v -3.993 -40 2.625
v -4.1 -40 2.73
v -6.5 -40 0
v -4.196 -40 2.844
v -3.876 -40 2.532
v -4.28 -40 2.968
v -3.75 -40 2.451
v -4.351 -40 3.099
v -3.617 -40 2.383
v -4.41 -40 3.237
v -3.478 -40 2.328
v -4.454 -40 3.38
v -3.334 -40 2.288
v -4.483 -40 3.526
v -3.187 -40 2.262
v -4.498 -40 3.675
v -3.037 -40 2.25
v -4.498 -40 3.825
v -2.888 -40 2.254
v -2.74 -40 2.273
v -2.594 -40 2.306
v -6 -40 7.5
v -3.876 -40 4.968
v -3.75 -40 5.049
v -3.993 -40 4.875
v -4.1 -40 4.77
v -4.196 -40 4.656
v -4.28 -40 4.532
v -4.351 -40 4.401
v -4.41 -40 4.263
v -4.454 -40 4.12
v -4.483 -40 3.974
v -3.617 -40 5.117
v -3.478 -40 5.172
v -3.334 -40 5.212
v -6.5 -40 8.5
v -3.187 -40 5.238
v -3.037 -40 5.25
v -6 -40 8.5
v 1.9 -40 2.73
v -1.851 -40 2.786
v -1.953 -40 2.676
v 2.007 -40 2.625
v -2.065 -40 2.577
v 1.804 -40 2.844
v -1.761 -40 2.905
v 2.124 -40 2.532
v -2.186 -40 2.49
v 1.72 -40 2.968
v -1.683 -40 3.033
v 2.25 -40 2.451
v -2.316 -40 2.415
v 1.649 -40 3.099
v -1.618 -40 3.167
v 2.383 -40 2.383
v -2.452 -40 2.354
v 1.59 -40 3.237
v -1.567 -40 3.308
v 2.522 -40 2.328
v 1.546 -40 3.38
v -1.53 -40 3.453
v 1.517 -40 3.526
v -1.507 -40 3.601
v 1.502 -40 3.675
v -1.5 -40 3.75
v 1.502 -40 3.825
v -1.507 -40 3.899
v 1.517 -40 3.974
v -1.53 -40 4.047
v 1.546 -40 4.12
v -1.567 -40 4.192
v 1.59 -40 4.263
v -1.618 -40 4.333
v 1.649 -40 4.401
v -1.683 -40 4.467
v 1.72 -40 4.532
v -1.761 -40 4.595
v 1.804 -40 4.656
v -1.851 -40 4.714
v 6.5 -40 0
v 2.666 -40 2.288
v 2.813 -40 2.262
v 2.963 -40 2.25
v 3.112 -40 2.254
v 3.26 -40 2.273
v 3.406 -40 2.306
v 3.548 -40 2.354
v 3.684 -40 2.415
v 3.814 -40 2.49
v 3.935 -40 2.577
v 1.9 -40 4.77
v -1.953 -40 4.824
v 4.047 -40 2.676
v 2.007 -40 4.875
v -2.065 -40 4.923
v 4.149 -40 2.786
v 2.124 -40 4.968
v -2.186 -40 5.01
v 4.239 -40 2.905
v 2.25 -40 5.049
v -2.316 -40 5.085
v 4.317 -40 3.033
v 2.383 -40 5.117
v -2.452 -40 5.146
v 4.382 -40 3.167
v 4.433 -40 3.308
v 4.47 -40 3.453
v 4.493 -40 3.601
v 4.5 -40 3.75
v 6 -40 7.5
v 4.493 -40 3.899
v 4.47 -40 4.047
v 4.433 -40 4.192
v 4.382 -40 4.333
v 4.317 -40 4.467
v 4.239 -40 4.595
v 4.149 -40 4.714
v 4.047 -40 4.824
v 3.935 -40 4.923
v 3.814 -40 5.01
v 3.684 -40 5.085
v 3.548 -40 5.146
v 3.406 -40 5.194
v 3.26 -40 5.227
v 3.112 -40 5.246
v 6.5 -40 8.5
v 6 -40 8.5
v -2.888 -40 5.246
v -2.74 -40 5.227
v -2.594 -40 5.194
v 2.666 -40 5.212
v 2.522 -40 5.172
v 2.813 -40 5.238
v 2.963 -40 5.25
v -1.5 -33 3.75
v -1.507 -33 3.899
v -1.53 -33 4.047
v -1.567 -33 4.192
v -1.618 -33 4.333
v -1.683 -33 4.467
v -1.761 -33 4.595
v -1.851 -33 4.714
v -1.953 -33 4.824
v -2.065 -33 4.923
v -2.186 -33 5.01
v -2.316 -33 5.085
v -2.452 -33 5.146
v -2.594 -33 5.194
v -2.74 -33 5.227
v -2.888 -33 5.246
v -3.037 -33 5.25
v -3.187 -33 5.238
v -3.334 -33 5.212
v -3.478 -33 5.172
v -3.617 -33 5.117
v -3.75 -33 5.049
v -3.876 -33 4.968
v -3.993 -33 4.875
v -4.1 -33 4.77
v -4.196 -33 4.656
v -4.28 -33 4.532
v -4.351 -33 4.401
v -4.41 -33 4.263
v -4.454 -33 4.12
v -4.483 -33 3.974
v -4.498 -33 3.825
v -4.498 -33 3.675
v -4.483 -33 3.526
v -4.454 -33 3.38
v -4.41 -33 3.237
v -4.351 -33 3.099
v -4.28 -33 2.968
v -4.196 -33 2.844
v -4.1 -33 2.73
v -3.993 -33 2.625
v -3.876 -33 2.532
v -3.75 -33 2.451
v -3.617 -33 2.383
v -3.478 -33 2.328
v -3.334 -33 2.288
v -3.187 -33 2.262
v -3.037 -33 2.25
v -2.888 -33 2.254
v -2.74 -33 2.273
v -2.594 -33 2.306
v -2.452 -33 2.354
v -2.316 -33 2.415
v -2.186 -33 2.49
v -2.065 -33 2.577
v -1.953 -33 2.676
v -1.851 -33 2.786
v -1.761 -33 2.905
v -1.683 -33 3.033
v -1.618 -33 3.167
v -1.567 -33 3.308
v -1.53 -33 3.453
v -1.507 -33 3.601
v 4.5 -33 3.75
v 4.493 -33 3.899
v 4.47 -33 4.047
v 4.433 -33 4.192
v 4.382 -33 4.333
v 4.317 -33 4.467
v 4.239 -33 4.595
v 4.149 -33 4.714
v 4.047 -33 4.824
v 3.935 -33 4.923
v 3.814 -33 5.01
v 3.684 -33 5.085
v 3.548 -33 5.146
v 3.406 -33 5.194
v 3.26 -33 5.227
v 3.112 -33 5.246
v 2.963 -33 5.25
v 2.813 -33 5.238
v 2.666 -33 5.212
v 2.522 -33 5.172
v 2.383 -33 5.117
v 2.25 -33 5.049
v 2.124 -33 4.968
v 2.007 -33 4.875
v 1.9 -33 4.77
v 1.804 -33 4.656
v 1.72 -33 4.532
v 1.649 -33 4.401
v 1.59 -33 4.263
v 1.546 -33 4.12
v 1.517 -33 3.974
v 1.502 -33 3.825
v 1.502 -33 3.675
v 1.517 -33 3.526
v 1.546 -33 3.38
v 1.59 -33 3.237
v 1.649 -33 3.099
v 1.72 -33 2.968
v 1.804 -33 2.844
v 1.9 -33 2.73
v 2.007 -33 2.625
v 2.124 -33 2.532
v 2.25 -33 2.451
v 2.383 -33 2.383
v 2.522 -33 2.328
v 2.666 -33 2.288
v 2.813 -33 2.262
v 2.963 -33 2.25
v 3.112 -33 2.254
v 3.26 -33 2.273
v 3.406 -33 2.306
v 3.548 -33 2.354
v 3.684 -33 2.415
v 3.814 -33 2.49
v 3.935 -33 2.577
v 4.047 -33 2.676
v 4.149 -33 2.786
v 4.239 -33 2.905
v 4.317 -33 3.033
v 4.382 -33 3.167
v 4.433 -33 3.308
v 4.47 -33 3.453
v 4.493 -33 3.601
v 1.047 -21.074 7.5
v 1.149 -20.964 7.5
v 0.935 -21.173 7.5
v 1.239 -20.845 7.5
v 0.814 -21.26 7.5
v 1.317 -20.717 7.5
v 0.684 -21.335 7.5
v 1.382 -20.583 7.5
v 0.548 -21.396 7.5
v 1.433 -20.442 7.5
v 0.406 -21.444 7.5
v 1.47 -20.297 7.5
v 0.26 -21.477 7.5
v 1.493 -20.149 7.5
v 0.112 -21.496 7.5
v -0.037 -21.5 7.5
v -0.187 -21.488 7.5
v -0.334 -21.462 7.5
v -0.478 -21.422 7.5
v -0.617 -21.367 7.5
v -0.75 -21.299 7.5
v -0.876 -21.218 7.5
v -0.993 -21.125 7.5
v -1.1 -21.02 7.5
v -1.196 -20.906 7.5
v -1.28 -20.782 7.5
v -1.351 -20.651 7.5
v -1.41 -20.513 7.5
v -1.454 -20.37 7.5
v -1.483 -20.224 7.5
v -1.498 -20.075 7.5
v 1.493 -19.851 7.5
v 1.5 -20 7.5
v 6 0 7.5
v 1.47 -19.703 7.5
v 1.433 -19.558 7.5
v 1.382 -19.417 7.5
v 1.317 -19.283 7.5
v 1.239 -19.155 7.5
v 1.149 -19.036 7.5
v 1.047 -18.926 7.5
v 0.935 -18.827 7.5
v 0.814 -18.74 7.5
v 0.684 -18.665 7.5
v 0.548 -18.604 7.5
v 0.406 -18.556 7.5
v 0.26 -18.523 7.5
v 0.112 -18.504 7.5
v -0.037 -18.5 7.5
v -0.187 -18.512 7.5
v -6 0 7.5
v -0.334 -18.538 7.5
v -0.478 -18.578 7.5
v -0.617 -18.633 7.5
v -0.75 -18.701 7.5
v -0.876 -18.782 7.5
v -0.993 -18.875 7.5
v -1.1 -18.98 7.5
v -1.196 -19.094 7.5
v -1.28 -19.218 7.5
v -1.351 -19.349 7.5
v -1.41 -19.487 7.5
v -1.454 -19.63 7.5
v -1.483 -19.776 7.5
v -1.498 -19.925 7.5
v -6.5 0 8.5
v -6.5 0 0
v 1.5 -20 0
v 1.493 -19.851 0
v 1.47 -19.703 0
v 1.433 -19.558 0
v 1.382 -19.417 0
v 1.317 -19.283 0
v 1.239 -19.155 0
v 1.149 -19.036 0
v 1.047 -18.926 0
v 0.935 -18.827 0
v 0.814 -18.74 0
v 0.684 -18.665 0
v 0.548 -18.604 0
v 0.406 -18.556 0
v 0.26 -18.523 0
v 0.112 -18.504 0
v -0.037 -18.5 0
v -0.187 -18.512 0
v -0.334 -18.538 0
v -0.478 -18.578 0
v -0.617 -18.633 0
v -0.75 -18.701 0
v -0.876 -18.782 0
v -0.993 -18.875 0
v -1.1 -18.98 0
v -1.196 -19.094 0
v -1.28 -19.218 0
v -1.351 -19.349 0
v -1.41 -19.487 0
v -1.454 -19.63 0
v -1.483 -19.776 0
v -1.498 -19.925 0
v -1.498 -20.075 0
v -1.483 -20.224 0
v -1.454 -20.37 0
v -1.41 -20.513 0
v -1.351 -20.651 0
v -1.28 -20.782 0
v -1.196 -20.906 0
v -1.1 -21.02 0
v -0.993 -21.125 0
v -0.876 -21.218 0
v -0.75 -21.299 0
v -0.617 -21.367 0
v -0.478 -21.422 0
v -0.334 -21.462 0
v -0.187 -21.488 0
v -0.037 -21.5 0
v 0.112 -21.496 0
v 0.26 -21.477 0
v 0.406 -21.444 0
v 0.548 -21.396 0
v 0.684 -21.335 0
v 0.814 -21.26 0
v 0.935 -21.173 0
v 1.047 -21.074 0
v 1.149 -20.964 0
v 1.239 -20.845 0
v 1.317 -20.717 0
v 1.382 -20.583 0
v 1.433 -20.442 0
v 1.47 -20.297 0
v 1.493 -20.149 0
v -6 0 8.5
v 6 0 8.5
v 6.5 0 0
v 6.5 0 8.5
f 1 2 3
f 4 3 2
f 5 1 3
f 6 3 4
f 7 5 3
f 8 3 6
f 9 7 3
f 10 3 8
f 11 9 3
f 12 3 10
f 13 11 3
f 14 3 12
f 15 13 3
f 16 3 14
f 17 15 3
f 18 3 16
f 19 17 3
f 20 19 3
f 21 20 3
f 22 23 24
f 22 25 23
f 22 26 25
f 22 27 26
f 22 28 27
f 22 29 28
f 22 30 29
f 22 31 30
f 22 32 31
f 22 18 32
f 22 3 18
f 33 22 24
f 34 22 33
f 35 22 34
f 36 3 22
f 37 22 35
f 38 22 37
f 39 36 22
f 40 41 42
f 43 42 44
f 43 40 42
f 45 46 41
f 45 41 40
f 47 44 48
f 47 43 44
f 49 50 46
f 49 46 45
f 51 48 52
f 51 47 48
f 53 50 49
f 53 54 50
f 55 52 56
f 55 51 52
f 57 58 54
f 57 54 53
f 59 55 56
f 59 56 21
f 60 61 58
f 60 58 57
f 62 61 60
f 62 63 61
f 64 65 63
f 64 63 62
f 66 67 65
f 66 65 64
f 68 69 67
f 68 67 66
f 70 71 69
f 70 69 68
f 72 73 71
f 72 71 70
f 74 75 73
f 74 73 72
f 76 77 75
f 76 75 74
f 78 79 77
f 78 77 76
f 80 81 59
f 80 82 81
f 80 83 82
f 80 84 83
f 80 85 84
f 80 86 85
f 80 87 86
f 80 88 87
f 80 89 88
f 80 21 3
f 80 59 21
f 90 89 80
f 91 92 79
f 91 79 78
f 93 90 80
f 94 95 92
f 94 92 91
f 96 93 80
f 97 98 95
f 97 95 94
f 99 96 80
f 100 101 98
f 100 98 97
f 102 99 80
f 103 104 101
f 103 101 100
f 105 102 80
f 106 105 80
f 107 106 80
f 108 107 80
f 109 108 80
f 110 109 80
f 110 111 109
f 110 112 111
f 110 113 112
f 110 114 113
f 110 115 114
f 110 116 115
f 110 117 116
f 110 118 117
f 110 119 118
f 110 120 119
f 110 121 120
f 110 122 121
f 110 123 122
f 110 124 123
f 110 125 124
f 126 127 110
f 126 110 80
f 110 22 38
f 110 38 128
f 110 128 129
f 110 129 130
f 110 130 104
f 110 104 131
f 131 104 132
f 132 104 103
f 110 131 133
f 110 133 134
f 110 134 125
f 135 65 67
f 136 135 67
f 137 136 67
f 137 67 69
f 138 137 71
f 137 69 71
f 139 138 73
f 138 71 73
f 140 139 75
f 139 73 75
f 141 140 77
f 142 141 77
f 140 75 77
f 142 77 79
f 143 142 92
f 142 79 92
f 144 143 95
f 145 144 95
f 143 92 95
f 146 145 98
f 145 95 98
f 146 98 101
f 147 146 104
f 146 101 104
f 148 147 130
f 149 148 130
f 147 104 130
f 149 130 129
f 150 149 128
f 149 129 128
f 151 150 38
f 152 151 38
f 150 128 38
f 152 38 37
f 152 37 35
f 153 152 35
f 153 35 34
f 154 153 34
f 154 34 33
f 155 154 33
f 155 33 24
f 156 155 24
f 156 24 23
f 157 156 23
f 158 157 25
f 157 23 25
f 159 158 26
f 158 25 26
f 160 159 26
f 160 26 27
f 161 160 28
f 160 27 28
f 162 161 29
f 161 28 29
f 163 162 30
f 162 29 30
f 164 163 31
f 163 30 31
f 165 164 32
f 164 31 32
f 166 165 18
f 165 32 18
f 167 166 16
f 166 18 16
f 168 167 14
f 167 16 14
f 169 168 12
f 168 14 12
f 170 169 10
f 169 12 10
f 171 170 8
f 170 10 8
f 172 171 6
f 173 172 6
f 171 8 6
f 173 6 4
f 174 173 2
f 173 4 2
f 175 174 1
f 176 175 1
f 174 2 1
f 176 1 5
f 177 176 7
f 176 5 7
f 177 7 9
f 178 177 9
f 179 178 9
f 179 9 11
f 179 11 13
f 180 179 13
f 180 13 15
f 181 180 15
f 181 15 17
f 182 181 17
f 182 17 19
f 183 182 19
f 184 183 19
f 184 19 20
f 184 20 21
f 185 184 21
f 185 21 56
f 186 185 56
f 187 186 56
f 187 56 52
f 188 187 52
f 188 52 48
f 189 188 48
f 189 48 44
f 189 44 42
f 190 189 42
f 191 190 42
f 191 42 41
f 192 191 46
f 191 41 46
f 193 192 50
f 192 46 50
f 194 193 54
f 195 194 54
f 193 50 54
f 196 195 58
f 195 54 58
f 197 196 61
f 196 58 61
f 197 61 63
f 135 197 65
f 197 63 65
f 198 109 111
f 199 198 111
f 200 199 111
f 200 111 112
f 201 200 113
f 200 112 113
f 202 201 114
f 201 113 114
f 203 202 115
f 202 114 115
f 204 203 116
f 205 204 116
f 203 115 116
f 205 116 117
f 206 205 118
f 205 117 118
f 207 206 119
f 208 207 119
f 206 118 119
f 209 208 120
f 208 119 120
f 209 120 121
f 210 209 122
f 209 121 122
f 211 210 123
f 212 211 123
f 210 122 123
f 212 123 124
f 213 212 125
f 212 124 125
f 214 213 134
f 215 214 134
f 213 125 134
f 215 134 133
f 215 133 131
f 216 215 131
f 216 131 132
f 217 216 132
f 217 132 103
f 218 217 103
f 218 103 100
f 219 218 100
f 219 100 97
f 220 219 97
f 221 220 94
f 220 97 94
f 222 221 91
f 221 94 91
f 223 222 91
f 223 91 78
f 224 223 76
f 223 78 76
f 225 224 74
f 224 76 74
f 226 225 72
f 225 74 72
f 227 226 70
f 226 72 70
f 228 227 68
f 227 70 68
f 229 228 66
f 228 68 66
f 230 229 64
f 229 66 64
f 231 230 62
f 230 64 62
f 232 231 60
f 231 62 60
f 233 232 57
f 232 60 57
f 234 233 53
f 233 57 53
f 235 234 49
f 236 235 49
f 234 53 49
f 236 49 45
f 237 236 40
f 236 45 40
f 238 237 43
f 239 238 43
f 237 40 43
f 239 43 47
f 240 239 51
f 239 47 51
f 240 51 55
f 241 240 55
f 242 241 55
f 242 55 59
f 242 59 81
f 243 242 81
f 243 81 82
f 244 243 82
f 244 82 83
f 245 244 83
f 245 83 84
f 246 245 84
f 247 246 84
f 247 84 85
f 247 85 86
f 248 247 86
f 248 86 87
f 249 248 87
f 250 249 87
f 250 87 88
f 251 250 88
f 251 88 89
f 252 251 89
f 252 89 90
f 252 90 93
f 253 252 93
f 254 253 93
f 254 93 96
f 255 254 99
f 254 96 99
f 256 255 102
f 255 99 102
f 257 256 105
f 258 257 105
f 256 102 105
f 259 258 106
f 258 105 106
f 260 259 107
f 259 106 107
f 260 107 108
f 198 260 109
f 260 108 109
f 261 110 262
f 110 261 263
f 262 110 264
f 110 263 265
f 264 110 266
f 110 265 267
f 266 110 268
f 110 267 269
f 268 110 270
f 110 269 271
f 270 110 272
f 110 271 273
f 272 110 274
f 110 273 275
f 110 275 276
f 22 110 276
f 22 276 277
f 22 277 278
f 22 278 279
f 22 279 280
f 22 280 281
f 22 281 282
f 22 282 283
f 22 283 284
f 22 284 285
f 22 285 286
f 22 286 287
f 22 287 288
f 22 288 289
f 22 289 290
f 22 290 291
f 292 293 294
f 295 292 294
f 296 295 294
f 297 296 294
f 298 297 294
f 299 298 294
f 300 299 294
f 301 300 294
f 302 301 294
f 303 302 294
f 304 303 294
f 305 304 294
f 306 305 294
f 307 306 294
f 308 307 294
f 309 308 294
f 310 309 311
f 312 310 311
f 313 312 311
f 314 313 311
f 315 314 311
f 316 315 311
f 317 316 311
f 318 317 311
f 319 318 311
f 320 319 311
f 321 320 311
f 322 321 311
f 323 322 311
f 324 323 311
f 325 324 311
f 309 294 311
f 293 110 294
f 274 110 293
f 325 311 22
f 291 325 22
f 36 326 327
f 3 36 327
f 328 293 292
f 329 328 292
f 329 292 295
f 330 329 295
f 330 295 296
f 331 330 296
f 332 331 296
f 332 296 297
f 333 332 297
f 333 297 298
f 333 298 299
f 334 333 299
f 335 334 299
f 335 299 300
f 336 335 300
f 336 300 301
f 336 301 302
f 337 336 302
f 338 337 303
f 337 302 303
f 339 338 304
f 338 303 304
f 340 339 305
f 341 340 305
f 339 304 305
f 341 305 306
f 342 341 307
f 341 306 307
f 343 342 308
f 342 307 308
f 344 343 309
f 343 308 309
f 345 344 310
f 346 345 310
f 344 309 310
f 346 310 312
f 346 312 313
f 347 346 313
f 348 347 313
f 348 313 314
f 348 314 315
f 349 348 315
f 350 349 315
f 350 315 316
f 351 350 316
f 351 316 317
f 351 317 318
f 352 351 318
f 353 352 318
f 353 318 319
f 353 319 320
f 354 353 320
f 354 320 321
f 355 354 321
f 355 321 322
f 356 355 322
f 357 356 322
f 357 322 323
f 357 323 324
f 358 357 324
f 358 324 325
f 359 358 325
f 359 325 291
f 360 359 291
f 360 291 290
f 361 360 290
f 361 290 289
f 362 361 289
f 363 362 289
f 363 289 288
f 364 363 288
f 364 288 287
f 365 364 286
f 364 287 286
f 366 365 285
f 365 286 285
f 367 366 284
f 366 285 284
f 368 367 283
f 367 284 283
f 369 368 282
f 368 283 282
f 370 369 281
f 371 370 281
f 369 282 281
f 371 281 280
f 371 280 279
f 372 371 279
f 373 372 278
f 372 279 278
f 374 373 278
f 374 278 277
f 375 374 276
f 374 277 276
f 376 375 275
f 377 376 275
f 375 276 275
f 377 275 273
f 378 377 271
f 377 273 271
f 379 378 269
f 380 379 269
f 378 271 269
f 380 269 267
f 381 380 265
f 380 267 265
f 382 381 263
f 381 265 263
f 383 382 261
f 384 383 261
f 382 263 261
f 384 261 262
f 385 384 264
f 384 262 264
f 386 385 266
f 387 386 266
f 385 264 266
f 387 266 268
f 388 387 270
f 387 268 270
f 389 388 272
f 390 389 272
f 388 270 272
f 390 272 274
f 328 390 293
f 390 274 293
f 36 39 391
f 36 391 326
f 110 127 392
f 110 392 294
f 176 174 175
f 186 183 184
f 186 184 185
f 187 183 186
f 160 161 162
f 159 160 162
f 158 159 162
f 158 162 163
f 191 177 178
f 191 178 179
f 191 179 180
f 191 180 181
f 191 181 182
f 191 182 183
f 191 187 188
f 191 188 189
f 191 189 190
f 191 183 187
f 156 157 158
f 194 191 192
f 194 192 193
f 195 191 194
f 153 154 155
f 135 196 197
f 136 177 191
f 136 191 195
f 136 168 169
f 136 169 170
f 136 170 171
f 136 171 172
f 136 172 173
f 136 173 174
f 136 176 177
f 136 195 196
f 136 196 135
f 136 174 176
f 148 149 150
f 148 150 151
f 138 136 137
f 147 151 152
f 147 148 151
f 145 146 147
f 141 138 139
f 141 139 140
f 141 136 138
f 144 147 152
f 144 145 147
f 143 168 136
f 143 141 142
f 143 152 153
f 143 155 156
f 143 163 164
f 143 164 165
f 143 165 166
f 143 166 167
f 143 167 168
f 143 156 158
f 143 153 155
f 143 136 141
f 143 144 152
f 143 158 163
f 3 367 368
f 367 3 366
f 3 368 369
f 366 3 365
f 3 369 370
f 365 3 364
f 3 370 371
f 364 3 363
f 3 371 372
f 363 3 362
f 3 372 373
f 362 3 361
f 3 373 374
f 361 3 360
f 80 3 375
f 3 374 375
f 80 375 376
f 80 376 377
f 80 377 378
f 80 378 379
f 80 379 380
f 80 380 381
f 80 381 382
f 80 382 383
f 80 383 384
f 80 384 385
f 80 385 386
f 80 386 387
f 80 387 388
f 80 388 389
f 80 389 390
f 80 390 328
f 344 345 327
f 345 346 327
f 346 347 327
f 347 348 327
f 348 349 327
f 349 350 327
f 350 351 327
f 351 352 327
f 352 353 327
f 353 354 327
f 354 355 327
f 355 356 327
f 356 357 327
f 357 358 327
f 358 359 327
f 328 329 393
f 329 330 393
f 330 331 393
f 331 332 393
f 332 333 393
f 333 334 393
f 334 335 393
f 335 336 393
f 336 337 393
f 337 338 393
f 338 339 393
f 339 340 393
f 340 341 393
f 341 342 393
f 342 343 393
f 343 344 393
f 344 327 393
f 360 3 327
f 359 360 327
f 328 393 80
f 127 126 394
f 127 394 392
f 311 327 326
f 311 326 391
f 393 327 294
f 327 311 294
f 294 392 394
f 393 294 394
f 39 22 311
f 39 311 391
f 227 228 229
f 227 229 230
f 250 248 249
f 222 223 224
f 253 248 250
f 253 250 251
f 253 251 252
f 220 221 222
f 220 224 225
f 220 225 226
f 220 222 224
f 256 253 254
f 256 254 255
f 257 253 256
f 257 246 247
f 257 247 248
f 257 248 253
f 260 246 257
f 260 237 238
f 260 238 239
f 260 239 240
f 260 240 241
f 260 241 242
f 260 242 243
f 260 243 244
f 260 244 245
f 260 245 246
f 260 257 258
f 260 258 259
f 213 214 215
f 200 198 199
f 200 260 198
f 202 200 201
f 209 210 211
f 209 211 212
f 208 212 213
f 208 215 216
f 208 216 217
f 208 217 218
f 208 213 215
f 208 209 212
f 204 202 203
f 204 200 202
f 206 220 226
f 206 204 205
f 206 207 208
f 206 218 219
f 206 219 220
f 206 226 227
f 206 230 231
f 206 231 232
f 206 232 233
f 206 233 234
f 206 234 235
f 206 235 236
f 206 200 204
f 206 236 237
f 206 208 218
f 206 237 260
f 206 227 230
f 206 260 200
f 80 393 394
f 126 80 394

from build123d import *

# Parameters (mm, degrees)
F1_DEPTH = 40
F2_R     = 1.5
F3_DEPTH = 25
F4_R     = 1.5
F5_DEPTH = 7


with BuildPart() as f1:
    # F0 (on Front) → F1 (new body)
    with BuildSketch(Plane.XZ):
        Polygon((0, 0), (0, 7.5), (-6, 7.5), (-6, 8.5), (-6.5, 8.5), (-6.5, 0), align=None)
        Polygon((6, 7.5), (0, 7.5), (0, 0), (6.5, 0), (6.5, 8.5), (6, 8.5), align=None)
    extrude(amount=F1_DEPTH)

    # F2 (on face) → F3 (cut)
    with BuildSketch(Plane.XY.offset(7.5)):
        with Locations((0, -20)):
            Circle(F2_R)
    extrude(amount=-F3_DEPTH, mode=Mode.SUBTRACT)

    # F4 (on face) → F5 (cut)
    with BuildSketch(Plane.XZ.offset(40)):
        with Locations((-3, 3.75)):
            Circle(F4_R)
        with Locations((3, 3.75)):
            Circle(F4_R)
    extrude(amount=-F5_DEPTH, mode=Mode.SUBTRACT)


solid = f1.part
